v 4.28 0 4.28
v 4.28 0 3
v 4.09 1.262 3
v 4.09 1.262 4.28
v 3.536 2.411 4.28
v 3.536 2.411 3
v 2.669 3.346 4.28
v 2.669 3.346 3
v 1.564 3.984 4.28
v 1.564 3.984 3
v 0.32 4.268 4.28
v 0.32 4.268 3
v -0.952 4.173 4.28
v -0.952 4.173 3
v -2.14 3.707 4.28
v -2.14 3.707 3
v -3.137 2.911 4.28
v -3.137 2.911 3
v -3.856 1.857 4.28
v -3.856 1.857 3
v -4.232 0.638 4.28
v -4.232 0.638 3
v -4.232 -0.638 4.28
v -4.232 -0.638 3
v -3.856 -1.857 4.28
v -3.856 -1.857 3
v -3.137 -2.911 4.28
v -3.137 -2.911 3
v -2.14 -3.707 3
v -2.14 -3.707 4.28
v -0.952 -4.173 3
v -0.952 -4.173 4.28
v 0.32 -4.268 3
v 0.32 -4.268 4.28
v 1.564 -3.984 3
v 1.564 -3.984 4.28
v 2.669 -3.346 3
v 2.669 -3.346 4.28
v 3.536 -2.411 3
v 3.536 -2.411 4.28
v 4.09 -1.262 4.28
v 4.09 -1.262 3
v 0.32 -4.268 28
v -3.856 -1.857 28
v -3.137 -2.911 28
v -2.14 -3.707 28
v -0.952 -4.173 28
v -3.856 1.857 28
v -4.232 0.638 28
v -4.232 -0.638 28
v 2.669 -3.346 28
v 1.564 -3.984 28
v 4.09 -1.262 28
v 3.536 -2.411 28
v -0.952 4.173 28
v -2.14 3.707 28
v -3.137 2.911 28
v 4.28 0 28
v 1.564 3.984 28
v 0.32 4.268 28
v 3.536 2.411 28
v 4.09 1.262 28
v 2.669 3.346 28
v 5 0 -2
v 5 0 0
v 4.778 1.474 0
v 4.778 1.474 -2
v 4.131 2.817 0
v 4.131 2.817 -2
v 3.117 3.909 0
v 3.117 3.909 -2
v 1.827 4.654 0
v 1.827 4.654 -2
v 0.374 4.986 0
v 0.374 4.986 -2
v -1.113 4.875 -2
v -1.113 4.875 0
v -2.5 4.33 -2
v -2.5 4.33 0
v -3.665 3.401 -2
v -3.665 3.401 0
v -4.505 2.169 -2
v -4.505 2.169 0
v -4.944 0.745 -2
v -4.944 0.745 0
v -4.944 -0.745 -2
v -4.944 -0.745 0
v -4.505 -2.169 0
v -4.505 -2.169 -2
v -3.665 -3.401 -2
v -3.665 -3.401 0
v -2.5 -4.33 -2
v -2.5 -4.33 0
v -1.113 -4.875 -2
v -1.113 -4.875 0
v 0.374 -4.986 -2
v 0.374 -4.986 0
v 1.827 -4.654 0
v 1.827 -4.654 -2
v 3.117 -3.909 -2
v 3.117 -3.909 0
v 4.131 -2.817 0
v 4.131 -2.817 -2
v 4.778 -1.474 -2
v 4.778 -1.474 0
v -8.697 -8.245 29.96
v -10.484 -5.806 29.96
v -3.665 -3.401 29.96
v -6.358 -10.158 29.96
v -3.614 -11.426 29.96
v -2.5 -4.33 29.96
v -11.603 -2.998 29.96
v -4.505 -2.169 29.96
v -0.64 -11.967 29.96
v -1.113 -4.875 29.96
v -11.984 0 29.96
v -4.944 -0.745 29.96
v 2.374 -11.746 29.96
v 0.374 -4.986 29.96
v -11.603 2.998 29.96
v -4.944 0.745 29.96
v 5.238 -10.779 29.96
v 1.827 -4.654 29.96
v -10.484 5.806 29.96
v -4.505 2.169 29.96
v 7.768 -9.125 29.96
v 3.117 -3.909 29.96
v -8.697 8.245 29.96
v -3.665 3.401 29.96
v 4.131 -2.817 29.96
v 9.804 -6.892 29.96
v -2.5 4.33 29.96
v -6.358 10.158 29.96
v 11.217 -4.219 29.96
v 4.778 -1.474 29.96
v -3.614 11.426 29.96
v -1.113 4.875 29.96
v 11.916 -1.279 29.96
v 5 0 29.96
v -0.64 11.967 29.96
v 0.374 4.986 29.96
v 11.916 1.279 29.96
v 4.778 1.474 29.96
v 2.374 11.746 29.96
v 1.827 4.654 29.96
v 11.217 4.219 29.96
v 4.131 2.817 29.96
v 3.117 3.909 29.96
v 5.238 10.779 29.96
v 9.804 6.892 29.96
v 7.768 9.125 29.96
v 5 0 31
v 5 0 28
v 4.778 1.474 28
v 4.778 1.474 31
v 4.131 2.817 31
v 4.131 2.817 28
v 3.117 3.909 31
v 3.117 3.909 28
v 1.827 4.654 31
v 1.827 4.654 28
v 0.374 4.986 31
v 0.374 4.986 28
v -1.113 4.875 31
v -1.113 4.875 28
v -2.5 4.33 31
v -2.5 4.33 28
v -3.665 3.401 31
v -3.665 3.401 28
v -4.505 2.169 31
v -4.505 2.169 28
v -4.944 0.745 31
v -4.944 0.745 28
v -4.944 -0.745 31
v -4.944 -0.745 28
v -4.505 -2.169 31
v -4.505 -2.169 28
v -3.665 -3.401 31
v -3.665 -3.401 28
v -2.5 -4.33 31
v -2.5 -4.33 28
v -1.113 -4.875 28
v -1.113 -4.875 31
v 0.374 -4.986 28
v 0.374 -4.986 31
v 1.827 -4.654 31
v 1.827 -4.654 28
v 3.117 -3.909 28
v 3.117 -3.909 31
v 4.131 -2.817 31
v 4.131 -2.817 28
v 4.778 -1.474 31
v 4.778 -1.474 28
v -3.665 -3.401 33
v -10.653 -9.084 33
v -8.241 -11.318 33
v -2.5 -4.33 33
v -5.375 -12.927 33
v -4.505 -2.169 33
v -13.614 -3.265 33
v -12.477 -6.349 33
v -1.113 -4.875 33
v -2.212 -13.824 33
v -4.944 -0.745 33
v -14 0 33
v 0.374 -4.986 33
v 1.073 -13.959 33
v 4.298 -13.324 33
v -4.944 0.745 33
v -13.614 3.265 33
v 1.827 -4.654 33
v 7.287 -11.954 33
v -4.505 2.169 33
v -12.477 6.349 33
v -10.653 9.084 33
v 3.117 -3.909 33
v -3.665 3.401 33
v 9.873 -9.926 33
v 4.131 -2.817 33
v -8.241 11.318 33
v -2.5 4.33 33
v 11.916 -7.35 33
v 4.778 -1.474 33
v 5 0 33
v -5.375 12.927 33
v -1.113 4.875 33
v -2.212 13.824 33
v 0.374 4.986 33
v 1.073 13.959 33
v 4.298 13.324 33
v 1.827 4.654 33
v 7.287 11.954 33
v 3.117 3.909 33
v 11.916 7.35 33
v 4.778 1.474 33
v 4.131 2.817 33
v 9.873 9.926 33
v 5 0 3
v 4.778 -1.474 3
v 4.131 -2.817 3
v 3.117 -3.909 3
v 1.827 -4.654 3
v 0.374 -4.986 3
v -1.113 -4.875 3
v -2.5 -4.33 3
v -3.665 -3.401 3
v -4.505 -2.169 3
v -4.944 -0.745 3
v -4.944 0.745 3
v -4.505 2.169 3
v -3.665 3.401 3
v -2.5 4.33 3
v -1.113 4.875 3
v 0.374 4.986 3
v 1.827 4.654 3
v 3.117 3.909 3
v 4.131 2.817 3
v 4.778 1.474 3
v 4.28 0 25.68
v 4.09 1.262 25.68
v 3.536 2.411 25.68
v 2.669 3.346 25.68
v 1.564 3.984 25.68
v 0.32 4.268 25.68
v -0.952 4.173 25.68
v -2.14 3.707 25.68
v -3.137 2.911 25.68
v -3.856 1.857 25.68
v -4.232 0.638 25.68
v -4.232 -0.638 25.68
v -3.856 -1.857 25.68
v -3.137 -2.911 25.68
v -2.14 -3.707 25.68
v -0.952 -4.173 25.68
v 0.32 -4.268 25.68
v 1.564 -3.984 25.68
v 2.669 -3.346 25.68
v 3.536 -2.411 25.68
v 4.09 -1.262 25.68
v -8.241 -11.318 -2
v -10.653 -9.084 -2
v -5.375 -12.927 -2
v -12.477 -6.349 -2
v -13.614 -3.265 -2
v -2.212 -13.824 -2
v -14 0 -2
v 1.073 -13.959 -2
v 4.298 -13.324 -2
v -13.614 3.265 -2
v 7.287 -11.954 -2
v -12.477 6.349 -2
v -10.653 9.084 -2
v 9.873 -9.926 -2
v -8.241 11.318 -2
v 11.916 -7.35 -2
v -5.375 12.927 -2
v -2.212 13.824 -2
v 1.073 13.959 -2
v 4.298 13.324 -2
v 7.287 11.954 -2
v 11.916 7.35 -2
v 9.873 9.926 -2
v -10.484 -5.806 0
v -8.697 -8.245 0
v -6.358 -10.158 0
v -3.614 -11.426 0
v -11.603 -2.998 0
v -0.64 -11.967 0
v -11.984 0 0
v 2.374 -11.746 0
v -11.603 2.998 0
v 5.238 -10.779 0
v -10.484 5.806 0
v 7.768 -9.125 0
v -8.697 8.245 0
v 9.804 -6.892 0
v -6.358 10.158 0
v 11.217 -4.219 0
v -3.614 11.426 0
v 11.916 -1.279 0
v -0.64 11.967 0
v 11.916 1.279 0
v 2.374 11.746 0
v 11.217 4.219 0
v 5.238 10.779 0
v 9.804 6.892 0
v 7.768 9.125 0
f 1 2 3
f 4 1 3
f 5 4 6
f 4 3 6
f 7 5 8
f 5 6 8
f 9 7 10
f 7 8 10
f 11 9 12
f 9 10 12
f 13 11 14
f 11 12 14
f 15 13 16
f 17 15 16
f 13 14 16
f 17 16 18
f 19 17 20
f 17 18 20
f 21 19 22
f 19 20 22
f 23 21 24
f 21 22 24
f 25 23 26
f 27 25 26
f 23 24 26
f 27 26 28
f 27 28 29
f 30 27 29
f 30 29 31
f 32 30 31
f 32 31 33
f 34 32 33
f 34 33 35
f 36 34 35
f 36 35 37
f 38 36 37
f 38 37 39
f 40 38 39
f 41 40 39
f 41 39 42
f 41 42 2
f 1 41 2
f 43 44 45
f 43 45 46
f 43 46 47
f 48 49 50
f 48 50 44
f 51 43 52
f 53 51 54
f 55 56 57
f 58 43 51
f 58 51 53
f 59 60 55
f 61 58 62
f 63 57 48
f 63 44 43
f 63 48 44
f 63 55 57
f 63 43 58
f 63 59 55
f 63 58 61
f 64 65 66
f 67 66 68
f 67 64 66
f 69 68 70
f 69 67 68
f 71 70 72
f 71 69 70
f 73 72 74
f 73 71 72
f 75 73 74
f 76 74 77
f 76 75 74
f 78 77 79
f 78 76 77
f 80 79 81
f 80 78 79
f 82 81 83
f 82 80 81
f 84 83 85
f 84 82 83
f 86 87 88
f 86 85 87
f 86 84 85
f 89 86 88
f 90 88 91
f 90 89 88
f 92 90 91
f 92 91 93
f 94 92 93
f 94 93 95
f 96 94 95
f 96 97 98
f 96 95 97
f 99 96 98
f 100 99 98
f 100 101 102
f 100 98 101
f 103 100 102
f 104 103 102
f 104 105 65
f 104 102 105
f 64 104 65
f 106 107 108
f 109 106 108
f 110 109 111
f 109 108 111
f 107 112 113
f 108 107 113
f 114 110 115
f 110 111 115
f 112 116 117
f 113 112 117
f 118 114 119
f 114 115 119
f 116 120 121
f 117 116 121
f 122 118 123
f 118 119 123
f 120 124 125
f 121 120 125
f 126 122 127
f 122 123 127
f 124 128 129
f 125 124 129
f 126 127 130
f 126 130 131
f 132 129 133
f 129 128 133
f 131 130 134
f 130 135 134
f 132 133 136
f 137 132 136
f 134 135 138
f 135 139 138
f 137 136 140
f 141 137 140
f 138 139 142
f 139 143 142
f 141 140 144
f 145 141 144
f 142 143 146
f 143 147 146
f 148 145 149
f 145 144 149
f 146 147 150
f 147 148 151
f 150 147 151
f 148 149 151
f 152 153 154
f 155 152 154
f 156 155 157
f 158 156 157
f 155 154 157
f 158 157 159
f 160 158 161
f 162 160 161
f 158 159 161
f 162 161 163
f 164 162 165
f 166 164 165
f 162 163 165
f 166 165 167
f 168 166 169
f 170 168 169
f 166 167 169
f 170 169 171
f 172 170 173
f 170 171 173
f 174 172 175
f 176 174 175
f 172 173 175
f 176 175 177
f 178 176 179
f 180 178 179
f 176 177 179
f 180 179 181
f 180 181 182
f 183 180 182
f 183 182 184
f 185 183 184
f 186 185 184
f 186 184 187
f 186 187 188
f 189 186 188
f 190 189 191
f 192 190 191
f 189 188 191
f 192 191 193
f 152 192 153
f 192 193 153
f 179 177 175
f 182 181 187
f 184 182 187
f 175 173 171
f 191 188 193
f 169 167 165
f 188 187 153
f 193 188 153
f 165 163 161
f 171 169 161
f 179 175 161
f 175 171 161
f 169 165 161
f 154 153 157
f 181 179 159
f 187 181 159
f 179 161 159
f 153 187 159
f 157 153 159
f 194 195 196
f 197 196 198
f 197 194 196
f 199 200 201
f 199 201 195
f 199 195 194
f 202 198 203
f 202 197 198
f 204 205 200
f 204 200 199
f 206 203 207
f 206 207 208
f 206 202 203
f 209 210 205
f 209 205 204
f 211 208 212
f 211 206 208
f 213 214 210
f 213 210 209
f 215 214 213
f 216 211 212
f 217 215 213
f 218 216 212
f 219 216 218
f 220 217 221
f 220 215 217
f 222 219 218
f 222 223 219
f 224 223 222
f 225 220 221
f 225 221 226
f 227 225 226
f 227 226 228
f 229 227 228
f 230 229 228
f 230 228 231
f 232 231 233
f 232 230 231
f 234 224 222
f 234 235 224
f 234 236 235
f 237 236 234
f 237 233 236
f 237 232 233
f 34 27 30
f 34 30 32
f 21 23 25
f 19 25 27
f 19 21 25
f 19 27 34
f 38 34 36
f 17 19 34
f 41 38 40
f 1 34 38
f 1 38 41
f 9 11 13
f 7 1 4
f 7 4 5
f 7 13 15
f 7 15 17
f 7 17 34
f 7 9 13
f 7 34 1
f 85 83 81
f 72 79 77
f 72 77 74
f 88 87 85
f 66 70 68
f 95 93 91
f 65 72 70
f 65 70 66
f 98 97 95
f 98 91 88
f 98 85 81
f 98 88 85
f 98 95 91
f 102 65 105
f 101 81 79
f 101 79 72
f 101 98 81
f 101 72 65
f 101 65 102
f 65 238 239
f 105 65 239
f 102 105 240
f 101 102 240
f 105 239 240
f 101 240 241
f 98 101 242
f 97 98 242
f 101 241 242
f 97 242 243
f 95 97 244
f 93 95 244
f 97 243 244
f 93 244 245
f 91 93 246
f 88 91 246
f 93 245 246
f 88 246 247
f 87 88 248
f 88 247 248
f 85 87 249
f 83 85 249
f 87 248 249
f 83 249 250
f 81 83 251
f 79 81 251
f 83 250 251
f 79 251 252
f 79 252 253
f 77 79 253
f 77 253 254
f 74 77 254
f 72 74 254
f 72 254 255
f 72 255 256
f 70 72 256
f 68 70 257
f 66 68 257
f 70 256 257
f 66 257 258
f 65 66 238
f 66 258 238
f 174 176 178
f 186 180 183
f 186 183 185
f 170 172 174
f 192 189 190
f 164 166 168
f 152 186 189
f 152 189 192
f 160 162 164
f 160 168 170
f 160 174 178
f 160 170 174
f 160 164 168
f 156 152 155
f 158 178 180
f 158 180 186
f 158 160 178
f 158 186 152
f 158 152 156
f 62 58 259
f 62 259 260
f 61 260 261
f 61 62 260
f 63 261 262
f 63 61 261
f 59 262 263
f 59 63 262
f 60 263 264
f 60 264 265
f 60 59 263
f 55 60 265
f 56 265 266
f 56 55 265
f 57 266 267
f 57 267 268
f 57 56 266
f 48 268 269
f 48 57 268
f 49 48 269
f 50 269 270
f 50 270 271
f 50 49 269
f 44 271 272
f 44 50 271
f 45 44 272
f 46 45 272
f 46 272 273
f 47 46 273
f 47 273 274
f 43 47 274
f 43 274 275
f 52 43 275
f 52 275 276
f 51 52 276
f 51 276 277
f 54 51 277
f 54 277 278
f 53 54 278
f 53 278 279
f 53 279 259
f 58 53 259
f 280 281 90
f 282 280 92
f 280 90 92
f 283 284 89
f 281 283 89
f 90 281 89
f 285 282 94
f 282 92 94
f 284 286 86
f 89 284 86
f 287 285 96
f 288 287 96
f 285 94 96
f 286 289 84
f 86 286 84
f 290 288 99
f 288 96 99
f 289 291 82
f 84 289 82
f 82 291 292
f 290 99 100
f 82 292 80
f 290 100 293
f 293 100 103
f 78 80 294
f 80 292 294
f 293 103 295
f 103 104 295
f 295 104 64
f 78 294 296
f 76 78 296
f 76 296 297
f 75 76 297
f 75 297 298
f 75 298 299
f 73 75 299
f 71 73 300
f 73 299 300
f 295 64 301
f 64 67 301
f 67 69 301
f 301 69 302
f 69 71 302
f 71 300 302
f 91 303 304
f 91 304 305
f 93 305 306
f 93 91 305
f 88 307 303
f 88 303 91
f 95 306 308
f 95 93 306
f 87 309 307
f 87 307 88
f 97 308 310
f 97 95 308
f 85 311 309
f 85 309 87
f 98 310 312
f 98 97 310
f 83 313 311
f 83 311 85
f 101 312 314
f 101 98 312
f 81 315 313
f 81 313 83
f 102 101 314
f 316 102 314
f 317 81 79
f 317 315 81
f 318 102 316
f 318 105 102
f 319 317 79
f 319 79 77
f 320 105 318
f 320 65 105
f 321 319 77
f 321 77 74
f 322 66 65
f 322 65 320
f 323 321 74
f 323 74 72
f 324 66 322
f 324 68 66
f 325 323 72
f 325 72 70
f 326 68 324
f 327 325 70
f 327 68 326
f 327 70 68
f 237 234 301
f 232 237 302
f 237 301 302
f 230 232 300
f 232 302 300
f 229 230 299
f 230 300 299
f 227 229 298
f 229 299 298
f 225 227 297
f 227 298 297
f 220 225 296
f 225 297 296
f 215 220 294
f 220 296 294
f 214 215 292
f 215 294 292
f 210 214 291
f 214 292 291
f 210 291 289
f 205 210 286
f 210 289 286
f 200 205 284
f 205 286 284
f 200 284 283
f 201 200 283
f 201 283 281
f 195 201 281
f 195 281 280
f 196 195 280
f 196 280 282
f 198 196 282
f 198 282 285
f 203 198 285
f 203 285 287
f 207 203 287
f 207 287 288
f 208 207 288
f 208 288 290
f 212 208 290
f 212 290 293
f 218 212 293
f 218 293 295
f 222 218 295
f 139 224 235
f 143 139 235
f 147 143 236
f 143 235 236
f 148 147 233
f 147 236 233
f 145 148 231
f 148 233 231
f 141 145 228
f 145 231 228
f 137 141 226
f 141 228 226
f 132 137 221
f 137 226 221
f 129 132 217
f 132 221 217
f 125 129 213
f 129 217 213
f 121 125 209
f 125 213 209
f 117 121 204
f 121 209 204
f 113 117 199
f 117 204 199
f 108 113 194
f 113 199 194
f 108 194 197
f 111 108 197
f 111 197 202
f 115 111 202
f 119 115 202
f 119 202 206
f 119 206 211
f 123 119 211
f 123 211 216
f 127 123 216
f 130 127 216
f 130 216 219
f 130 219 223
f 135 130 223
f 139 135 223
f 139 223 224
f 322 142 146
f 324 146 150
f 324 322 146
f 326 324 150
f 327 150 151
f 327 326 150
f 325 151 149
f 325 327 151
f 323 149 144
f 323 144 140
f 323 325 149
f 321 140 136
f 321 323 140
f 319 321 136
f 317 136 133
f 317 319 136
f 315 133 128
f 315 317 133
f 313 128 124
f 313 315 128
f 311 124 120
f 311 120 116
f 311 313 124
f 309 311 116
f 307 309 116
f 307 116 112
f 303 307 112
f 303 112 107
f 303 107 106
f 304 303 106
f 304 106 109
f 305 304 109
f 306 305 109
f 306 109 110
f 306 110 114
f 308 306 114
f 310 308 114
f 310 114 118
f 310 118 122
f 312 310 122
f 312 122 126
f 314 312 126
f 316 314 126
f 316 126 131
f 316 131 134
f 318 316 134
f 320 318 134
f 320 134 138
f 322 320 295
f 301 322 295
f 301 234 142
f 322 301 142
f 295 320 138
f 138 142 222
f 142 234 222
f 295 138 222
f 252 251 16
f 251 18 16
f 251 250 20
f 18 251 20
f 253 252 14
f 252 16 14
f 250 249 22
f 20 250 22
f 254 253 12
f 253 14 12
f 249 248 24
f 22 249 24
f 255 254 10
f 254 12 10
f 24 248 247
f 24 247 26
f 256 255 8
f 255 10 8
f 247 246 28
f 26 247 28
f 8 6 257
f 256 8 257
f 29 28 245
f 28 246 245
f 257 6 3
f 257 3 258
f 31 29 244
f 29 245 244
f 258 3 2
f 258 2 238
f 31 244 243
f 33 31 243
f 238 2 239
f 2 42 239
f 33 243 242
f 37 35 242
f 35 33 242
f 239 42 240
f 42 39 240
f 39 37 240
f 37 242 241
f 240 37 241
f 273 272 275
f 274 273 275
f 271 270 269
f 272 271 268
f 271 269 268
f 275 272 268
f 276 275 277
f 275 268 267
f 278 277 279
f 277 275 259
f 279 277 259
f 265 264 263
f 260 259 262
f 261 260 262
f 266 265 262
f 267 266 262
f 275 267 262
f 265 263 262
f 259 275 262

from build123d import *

# Parameters (mm, degrees)
F0_R      = 14
F2_DEPTH  = 35
F3_R      = 5
F4_DEPTH  = 5
F1_R      = 5
F5_DEPTH  = 5
F7_SCALE  = 0.856
F10_R     = 5
F10_R_2   = 4.28
F11_DEPTH = 3
F12_R     = 5
F12_R_2   = 4.28
F13_DEPTH = 3
F15_DEPTH = 41.7


with BuildPart() as f2:
    # F0 (on Top) → F2 (new body)
    with BuildSketch(Plane.XY):
        Circle(F0_R)
    extrude(amount=F2_DEPTH)

    # F3 (on face) → F4 (cut)
    with BuildSketch(Plane.XY.offset(35)):
        Circle(F3_R)
    extrude(amount=-F4_DEPTH, mode=Mode.SUBTRACT)

    # F1 (on Top) → F5 (cut)
    with BuildSketch(Plane.XY):
        Circle(F1_R)
    extrude(amount=F5_DEPTH, mode=Mode.SUBTRACT)


with BuildPart() as f6_1:
    # F6: copy of F2
    add(f2.part.moved(Location((0, 0, -2))))


with BuildPart() as f7_1:
    # F7: copy of F2
    add(f2.part.scale(F7_SCALE))


with BuildPart() as f6_1_1:
    add(f6_1.part)

    # F9: cut F7_1
    add(f7_1.part, mode=Mode.SUBTRACT)

    # F12 (on face) → F13 (join)
    with BuildSketch(Plane(origin=(0, 0, 3), x_dir=(1, 0, 0), z_dir=(0, 0, -1))):
        Circle(F12_R)
        Circle(F12_R_2, mode=Mode.SUBTRACT)
        Circle(F12_R_2)
    extrude(amount=F13_DEPTH)

    # F14 (on face) → F15 (cut)
    with BuildSketch(Plane.XY.offset(33)):
        with BuildLine():
            Line((11.9155967814, -7.349731515), (11.9155967814, -11.6381047294))
            Line((11.9155967814, -11.6381047294), (22.9155967814, -11.6381047294))
            Line((22.9155967814, -11.6381047294), (22.9155967814, 13.3618952706))
            Line((22.9155967814, 13.3618952706), (11.9155967814, 13.3618952706))
            Line((11.9155967814, 13.3618952706), (11.9155967814, 7.349731515))
            ThreePointArc((11.9155967814, 7.349731515), (13.4688224233, 3.8197935193), (14, 0))
            ThreePointArc((14, 0), (13.4688224233, -3.8197935193), (11.9155967814, -7.349731515))
        make_face()
        with BuildLine():
            Line((11.9155967814, 7.349731515), (11.9155967814, -7.349731515))
            ThreePointArc((11.9155967814, -7.349731515), (13.4688224233, -3.8197935193), (14, 0))
            ThreePointArc((14, 0), (13.4688224233, 3.8197935193), (11.9155967814, 7.349731515))
        make_face()
    extrude(amount=-F15_DEPTH, mode=Mode.SUBTRACT)


with BuildPart() as f11:
    # F10 (on face) → F11 (new body)
    with BuildSketch(Plane.XY.offset(28)):
        Circle(F10_R)
        Circle(F10_R_2, mode=Mode.SUBTRACT)
        Circle(F10_R_2)
    extrude(amount=F11_DEPTH)


solid = Compound([f6_1_1.part, f11.part])
